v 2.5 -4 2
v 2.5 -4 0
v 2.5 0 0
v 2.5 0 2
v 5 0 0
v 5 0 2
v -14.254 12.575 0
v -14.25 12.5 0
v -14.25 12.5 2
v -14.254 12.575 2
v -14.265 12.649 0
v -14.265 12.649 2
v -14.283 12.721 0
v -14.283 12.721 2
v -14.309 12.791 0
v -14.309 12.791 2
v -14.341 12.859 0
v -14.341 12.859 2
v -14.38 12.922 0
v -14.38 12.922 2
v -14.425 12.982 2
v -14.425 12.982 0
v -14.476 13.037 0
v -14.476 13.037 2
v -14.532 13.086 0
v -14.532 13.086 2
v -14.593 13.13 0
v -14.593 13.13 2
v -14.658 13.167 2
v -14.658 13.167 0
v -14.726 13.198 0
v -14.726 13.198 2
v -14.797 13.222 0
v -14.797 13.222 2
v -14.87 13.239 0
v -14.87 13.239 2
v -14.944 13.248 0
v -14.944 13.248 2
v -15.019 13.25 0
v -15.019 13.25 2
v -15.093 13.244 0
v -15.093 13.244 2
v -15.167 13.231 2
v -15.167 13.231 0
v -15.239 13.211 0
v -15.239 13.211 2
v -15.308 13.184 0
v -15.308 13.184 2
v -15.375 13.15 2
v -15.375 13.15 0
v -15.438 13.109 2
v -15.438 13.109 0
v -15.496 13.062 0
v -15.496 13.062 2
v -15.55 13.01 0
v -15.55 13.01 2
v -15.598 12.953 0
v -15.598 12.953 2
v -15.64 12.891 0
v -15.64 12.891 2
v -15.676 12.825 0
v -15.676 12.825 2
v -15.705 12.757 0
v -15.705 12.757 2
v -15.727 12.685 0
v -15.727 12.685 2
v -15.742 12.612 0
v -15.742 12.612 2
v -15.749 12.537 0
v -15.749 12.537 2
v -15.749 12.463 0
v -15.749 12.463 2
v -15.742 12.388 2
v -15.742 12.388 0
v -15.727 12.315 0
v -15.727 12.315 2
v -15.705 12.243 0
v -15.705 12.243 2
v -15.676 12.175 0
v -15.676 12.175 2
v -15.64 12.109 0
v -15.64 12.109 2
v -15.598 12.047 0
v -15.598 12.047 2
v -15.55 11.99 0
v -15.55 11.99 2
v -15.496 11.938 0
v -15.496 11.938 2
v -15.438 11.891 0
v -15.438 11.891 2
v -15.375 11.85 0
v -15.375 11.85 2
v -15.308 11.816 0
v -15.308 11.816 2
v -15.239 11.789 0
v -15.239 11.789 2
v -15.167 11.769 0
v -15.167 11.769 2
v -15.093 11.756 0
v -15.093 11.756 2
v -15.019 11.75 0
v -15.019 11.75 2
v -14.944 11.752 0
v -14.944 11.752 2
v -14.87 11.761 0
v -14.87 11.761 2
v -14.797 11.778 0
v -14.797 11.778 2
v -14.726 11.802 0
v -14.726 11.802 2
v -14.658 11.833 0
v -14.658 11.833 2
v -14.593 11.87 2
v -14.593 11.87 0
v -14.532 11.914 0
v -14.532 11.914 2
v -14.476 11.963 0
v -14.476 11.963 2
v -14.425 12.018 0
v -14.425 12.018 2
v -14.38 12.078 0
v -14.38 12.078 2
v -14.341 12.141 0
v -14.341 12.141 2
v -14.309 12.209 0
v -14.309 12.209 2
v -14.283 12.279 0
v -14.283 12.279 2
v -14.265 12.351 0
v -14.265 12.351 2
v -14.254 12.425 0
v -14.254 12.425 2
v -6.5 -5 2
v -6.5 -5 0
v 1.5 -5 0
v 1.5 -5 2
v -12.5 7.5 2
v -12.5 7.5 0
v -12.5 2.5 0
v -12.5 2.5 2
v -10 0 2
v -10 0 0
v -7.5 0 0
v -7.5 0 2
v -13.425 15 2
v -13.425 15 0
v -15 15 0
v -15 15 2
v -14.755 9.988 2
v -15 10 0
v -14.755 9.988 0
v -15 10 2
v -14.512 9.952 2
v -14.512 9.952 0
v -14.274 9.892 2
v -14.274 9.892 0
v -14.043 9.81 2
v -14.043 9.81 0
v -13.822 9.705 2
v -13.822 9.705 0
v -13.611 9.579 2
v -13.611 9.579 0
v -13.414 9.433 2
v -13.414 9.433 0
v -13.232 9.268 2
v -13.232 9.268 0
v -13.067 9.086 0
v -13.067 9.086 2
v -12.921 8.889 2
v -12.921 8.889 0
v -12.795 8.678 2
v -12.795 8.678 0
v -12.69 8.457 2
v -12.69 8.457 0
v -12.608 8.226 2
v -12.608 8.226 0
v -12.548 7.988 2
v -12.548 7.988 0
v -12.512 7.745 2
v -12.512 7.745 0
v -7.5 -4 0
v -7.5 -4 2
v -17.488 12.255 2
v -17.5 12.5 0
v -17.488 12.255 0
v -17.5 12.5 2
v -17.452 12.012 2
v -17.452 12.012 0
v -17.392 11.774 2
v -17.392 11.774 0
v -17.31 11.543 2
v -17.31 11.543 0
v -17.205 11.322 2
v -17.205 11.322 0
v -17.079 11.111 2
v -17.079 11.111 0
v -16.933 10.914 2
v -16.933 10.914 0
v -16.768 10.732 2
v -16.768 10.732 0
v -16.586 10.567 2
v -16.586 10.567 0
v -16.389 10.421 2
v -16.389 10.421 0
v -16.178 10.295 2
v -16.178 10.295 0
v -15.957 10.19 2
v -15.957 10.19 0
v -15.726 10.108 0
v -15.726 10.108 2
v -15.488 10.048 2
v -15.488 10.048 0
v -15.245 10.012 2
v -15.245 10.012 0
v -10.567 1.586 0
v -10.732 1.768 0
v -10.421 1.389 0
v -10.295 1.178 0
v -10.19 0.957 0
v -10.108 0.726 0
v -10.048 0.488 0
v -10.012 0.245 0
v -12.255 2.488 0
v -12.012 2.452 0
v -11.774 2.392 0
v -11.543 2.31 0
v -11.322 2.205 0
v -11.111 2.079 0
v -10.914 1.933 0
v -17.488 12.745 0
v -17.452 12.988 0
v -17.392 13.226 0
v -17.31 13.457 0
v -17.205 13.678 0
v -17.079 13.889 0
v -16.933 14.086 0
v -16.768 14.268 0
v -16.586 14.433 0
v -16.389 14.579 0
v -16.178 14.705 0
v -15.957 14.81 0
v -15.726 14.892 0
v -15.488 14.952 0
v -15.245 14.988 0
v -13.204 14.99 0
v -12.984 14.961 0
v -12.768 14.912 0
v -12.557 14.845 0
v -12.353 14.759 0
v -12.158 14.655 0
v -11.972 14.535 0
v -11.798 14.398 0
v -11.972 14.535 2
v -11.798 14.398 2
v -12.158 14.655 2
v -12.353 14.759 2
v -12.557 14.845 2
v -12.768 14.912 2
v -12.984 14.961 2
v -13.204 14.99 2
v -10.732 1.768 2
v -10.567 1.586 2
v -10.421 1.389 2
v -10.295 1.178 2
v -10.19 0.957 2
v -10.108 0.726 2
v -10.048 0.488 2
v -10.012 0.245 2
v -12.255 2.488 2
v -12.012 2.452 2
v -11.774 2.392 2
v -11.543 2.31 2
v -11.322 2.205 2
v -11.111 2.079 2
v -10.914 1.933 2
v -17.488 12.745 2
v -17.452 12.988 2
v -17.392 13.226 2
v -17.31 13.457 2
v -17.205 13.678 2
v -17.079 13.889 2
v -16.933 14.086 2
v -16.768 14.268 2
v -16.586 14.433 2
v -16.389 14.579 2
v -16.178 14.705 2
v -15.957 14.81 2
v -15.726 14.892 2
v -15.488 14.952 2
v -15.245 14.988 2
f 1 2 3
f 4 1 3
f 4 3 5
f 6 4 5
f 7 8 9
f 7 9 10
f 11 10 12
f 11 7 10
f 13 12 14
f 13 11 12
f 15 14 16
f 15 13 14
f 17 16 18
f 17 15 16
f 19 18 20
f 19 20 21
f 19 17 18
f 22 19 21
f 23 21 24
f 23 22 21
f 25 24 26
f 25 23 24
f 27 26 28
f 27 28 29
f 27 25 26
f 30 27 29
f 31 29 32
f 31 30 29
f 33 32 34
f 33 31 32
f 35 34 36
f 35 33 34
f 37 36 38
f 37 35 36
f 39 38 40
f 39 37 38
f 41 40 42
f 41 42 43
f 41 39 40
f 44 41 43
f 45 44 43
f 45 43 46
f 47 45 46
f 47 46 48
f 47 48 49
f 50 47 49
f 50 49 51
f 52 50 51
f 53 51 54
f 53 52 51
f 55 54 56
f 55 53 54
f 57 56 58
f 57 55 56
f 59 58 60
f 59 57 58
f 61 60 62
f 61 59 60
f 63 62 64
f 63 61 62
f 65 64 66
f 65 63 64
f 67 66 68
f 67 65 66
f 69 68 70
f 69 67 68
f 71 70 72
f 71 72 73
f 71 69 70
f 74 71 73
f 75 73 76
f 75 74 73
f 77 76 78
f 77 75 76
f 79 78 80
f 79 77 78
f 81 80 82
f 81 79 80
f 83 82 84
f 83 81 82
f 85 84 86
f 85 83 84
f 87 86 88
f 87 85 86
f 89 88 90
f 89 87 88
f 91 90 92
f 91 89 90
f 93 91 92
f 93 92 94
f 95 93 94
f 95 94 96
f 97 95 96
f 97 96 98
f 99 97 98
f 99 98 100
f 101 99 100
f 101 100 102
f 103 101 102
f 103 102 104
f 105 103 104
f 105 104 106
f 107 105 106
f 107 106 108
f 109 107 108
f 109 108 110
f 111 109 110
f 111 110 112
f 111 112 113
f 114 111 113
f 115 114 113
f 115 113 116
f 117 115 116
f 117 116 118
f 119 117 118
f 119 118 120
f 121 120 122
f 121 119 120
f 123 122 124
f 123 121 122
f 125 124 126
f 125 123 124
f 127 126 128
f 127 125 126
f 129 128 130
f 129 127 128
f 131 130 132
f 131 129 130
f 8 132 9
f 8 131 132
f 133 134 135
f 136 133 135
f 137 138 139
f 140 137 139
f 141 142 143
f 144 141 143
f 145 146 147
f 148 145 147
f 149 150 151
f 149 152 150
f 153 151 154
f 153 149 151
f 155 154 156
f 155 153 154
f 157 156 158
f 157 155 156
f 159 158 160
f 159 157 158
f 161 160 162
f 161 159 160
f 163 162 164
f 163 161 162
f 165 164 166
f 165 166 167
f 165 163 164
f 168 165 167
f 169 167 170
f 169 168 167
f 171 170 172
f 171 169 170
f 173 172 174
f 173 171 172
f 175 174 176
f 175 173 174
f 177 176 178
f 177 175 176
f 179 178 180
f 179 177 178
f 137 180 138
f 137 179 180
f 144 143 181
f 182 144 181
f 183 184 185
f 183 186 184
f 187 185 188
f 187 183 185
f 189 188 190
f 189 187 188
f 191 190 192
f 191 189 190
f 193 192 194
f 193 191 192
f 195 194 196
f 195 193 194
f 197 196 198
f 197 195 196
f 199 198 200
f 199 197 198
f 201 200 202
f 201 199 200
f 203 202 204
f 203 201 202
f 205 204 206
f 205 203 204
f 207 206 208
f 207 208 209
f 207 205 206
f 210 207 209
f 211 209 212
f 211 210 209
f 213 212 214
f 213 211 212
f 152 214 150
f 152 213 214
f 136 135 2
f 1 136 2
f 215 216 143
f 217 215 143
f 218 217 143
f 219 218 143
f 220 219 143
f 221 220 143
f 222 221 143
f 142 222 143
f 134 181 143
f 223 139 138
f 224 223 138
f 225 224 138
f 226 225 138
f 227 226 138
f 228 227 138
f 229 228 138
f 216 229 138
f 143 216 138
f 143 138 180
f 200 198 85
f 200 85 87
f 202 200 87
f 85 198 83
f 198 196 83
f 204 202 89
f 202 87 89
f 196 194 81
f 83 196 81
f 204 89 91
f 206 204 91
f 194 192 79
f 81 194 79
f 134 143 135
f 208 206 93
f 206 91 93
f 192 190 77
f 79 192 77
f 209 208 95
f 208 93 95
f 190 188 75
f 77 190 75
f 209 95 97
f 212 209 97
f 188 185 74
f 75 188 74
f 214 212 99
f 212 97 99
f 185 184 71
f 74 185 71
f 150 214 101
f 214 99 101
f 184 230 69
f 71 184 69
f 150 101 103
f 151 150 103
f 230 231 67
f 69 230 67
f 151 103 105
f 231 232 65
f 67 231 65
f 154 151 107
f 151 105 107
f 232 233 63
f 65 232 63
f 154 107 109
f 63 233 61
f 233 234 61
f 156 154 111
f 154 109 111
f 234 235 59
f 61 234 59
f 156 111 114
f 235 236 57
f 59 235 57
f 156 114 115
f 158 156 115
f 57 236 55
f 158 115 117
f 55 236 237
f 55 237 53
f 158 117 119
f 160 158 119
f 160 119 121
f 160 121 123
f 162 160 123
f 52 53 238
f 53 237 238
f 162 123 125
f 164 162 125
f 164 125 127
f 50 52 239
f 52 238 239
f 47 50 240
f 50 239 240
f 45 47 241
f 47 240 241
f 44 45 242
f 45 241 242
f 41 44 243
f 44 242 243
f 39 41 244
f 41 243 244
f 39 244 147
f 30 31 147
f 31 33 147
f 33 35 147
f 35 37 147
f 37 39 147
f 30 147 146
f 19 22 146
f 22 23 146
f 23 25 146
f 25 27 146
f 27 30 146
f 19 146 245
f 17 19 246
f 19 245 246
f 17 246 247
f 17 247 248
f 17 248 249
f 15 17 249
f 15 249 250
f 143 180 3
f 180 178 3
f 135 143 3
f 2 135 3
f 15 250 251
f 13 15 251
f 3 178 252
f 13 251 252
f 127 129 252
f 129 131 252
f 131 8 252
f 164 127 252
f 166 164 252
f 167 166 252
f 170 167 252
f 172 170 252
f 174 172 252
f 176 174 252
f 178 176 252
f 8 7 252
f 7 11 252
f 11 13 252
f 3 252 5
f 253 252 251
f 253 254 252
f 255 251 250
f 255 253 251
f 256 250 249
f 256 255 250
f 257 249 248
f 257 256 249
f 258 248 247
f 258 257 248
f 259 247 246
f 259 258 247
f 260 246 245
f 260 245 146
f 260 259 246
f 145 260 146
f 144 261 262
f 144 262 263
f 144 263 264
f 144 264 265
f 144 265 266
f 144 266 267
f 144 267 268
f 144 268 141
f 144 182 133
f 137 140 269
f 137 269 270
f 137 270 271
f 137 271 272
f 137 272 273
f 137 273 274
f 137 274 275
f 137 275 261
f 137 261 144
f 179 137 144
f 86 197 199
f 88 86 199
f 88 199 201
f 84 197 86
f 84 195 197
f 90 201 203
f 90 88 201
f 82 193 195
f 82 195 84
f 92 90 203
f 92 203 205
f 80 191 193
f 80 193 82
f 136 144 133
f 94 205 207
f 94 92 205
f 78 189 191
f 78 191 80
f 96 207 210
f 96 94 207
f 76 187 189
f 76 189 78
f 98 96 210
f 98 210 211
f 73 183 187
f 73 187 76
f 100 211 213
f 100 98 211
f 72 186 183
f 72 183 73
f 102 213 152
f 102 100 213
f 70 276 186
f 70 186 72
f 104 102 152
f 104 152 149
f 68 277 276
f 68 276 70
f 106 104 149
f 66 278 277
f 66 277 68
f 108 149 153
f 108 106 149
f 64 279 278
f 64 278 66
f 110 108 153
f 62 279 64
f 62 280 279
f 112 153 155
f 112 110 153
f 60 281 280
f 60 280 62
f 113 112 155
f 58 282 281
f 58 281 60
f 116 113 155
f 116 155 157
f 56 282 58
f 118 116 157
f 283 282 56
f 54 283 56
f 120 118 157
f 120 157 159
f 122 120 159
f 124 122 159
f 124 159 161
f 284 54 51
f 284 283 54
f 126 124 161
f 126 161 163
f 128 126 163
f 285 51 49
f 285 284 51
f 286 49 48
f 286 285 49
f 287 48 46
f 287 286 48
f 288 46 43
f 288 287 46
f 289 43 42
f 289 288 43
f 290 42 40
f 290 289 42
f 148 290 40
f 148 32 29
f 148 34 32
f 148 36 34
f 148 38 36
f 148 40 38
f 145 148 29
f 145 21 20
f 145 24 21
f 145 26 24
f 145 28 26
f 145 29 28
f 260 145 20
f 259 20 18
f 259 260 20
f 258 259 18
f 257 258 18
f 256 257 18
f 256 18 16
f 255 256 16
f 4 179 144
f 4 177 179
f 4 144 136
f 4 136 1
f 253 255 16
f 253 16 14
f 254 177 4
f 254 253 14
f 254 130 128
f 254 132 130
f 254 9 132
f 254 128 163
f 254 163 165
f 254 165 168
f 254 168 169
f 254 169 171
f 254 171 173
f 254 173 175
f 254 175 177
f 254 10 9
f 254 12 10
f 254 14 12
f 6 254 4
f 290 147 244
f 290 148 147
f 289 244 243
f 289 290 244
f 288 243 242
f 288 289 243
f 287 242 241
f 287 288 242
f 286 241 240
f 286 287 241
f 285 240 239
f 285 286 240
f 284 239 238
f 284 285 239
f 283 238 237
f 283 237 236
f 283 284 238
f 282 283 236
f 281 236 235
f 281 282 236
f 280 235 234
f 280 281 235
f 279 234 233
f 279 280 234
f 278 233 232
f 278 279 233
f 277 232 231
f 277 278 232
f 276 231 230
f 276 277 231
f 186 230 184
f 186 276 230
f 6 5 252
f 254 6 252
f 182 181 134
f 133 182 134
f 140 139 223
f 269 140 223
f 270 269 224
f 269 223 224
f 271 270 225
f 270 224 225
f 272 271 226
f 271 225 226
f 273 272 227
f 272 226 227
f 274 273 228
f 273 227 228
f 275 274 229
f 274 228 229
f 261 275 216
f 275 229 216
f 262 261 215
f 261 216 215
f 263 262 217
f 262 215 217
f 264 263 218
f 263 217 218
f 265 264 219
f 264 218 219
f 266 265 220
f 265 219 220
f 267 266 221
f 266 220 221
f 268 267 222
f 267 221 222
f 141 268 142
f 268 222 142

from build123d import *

# Parameters (mm, degrees)
F0_R     = 0.75
F1_DEPTH = 2
F2_R     = 2.49999


# Not quite as in the source:
# - a fillet or chamfer is up to 0.001 mm smaller than in the source, because OpenCascade refuses the exact size


with BuildPart() as f1:
    # F0 (on Top) → F1 (new body)
    with BuildSketch(Plane.XY):
        with BuildLine():
            Line((-10, 0), (-7.5, 0))
            Line((-7.5, 0), (2.5, 0))
            Line((2.5, 0), (5, 0))
            Line((5, 0), (-12.5, 15))
            Line((-12.5, 15), (-17.5, 15))
            Line((-17.5, 15), (-17.5, 10))
            Line((-17.5, 10), (-12.5, 10))
            Line((-12.5, 10), (-12.5, 2.5))
            ThreePointArc((-12.5, 2.5), (-10.732233047, 1.767766953), (-10, 0))
        make_face()
        with Locations((-15, 12.5)):
            Circle(F0_R, mode=Mode.SUBTRACT)
        Polygon((-7.5, -4), (-6.5, -5), (1.5, -5), (2.5, -4), (2.5, 0), (-7.5, 0), align=None)
    extrude(amount=F1_DEPTH)

    # F2 (radius 2.5 in the source; OpenCascade refuses exactly that, so slightly less here)
    f2_edges = [f1.edges().sort_by_distance(p)[0] for p in [
        (-17.5, 15, 1),
        (-17.5, 10, 1),
        (-12.5, 15, 1),
        (-12.5, 10, 1),
    ]]
    fillet(f2_edges, radius=F2_R)


solid = f1.part
